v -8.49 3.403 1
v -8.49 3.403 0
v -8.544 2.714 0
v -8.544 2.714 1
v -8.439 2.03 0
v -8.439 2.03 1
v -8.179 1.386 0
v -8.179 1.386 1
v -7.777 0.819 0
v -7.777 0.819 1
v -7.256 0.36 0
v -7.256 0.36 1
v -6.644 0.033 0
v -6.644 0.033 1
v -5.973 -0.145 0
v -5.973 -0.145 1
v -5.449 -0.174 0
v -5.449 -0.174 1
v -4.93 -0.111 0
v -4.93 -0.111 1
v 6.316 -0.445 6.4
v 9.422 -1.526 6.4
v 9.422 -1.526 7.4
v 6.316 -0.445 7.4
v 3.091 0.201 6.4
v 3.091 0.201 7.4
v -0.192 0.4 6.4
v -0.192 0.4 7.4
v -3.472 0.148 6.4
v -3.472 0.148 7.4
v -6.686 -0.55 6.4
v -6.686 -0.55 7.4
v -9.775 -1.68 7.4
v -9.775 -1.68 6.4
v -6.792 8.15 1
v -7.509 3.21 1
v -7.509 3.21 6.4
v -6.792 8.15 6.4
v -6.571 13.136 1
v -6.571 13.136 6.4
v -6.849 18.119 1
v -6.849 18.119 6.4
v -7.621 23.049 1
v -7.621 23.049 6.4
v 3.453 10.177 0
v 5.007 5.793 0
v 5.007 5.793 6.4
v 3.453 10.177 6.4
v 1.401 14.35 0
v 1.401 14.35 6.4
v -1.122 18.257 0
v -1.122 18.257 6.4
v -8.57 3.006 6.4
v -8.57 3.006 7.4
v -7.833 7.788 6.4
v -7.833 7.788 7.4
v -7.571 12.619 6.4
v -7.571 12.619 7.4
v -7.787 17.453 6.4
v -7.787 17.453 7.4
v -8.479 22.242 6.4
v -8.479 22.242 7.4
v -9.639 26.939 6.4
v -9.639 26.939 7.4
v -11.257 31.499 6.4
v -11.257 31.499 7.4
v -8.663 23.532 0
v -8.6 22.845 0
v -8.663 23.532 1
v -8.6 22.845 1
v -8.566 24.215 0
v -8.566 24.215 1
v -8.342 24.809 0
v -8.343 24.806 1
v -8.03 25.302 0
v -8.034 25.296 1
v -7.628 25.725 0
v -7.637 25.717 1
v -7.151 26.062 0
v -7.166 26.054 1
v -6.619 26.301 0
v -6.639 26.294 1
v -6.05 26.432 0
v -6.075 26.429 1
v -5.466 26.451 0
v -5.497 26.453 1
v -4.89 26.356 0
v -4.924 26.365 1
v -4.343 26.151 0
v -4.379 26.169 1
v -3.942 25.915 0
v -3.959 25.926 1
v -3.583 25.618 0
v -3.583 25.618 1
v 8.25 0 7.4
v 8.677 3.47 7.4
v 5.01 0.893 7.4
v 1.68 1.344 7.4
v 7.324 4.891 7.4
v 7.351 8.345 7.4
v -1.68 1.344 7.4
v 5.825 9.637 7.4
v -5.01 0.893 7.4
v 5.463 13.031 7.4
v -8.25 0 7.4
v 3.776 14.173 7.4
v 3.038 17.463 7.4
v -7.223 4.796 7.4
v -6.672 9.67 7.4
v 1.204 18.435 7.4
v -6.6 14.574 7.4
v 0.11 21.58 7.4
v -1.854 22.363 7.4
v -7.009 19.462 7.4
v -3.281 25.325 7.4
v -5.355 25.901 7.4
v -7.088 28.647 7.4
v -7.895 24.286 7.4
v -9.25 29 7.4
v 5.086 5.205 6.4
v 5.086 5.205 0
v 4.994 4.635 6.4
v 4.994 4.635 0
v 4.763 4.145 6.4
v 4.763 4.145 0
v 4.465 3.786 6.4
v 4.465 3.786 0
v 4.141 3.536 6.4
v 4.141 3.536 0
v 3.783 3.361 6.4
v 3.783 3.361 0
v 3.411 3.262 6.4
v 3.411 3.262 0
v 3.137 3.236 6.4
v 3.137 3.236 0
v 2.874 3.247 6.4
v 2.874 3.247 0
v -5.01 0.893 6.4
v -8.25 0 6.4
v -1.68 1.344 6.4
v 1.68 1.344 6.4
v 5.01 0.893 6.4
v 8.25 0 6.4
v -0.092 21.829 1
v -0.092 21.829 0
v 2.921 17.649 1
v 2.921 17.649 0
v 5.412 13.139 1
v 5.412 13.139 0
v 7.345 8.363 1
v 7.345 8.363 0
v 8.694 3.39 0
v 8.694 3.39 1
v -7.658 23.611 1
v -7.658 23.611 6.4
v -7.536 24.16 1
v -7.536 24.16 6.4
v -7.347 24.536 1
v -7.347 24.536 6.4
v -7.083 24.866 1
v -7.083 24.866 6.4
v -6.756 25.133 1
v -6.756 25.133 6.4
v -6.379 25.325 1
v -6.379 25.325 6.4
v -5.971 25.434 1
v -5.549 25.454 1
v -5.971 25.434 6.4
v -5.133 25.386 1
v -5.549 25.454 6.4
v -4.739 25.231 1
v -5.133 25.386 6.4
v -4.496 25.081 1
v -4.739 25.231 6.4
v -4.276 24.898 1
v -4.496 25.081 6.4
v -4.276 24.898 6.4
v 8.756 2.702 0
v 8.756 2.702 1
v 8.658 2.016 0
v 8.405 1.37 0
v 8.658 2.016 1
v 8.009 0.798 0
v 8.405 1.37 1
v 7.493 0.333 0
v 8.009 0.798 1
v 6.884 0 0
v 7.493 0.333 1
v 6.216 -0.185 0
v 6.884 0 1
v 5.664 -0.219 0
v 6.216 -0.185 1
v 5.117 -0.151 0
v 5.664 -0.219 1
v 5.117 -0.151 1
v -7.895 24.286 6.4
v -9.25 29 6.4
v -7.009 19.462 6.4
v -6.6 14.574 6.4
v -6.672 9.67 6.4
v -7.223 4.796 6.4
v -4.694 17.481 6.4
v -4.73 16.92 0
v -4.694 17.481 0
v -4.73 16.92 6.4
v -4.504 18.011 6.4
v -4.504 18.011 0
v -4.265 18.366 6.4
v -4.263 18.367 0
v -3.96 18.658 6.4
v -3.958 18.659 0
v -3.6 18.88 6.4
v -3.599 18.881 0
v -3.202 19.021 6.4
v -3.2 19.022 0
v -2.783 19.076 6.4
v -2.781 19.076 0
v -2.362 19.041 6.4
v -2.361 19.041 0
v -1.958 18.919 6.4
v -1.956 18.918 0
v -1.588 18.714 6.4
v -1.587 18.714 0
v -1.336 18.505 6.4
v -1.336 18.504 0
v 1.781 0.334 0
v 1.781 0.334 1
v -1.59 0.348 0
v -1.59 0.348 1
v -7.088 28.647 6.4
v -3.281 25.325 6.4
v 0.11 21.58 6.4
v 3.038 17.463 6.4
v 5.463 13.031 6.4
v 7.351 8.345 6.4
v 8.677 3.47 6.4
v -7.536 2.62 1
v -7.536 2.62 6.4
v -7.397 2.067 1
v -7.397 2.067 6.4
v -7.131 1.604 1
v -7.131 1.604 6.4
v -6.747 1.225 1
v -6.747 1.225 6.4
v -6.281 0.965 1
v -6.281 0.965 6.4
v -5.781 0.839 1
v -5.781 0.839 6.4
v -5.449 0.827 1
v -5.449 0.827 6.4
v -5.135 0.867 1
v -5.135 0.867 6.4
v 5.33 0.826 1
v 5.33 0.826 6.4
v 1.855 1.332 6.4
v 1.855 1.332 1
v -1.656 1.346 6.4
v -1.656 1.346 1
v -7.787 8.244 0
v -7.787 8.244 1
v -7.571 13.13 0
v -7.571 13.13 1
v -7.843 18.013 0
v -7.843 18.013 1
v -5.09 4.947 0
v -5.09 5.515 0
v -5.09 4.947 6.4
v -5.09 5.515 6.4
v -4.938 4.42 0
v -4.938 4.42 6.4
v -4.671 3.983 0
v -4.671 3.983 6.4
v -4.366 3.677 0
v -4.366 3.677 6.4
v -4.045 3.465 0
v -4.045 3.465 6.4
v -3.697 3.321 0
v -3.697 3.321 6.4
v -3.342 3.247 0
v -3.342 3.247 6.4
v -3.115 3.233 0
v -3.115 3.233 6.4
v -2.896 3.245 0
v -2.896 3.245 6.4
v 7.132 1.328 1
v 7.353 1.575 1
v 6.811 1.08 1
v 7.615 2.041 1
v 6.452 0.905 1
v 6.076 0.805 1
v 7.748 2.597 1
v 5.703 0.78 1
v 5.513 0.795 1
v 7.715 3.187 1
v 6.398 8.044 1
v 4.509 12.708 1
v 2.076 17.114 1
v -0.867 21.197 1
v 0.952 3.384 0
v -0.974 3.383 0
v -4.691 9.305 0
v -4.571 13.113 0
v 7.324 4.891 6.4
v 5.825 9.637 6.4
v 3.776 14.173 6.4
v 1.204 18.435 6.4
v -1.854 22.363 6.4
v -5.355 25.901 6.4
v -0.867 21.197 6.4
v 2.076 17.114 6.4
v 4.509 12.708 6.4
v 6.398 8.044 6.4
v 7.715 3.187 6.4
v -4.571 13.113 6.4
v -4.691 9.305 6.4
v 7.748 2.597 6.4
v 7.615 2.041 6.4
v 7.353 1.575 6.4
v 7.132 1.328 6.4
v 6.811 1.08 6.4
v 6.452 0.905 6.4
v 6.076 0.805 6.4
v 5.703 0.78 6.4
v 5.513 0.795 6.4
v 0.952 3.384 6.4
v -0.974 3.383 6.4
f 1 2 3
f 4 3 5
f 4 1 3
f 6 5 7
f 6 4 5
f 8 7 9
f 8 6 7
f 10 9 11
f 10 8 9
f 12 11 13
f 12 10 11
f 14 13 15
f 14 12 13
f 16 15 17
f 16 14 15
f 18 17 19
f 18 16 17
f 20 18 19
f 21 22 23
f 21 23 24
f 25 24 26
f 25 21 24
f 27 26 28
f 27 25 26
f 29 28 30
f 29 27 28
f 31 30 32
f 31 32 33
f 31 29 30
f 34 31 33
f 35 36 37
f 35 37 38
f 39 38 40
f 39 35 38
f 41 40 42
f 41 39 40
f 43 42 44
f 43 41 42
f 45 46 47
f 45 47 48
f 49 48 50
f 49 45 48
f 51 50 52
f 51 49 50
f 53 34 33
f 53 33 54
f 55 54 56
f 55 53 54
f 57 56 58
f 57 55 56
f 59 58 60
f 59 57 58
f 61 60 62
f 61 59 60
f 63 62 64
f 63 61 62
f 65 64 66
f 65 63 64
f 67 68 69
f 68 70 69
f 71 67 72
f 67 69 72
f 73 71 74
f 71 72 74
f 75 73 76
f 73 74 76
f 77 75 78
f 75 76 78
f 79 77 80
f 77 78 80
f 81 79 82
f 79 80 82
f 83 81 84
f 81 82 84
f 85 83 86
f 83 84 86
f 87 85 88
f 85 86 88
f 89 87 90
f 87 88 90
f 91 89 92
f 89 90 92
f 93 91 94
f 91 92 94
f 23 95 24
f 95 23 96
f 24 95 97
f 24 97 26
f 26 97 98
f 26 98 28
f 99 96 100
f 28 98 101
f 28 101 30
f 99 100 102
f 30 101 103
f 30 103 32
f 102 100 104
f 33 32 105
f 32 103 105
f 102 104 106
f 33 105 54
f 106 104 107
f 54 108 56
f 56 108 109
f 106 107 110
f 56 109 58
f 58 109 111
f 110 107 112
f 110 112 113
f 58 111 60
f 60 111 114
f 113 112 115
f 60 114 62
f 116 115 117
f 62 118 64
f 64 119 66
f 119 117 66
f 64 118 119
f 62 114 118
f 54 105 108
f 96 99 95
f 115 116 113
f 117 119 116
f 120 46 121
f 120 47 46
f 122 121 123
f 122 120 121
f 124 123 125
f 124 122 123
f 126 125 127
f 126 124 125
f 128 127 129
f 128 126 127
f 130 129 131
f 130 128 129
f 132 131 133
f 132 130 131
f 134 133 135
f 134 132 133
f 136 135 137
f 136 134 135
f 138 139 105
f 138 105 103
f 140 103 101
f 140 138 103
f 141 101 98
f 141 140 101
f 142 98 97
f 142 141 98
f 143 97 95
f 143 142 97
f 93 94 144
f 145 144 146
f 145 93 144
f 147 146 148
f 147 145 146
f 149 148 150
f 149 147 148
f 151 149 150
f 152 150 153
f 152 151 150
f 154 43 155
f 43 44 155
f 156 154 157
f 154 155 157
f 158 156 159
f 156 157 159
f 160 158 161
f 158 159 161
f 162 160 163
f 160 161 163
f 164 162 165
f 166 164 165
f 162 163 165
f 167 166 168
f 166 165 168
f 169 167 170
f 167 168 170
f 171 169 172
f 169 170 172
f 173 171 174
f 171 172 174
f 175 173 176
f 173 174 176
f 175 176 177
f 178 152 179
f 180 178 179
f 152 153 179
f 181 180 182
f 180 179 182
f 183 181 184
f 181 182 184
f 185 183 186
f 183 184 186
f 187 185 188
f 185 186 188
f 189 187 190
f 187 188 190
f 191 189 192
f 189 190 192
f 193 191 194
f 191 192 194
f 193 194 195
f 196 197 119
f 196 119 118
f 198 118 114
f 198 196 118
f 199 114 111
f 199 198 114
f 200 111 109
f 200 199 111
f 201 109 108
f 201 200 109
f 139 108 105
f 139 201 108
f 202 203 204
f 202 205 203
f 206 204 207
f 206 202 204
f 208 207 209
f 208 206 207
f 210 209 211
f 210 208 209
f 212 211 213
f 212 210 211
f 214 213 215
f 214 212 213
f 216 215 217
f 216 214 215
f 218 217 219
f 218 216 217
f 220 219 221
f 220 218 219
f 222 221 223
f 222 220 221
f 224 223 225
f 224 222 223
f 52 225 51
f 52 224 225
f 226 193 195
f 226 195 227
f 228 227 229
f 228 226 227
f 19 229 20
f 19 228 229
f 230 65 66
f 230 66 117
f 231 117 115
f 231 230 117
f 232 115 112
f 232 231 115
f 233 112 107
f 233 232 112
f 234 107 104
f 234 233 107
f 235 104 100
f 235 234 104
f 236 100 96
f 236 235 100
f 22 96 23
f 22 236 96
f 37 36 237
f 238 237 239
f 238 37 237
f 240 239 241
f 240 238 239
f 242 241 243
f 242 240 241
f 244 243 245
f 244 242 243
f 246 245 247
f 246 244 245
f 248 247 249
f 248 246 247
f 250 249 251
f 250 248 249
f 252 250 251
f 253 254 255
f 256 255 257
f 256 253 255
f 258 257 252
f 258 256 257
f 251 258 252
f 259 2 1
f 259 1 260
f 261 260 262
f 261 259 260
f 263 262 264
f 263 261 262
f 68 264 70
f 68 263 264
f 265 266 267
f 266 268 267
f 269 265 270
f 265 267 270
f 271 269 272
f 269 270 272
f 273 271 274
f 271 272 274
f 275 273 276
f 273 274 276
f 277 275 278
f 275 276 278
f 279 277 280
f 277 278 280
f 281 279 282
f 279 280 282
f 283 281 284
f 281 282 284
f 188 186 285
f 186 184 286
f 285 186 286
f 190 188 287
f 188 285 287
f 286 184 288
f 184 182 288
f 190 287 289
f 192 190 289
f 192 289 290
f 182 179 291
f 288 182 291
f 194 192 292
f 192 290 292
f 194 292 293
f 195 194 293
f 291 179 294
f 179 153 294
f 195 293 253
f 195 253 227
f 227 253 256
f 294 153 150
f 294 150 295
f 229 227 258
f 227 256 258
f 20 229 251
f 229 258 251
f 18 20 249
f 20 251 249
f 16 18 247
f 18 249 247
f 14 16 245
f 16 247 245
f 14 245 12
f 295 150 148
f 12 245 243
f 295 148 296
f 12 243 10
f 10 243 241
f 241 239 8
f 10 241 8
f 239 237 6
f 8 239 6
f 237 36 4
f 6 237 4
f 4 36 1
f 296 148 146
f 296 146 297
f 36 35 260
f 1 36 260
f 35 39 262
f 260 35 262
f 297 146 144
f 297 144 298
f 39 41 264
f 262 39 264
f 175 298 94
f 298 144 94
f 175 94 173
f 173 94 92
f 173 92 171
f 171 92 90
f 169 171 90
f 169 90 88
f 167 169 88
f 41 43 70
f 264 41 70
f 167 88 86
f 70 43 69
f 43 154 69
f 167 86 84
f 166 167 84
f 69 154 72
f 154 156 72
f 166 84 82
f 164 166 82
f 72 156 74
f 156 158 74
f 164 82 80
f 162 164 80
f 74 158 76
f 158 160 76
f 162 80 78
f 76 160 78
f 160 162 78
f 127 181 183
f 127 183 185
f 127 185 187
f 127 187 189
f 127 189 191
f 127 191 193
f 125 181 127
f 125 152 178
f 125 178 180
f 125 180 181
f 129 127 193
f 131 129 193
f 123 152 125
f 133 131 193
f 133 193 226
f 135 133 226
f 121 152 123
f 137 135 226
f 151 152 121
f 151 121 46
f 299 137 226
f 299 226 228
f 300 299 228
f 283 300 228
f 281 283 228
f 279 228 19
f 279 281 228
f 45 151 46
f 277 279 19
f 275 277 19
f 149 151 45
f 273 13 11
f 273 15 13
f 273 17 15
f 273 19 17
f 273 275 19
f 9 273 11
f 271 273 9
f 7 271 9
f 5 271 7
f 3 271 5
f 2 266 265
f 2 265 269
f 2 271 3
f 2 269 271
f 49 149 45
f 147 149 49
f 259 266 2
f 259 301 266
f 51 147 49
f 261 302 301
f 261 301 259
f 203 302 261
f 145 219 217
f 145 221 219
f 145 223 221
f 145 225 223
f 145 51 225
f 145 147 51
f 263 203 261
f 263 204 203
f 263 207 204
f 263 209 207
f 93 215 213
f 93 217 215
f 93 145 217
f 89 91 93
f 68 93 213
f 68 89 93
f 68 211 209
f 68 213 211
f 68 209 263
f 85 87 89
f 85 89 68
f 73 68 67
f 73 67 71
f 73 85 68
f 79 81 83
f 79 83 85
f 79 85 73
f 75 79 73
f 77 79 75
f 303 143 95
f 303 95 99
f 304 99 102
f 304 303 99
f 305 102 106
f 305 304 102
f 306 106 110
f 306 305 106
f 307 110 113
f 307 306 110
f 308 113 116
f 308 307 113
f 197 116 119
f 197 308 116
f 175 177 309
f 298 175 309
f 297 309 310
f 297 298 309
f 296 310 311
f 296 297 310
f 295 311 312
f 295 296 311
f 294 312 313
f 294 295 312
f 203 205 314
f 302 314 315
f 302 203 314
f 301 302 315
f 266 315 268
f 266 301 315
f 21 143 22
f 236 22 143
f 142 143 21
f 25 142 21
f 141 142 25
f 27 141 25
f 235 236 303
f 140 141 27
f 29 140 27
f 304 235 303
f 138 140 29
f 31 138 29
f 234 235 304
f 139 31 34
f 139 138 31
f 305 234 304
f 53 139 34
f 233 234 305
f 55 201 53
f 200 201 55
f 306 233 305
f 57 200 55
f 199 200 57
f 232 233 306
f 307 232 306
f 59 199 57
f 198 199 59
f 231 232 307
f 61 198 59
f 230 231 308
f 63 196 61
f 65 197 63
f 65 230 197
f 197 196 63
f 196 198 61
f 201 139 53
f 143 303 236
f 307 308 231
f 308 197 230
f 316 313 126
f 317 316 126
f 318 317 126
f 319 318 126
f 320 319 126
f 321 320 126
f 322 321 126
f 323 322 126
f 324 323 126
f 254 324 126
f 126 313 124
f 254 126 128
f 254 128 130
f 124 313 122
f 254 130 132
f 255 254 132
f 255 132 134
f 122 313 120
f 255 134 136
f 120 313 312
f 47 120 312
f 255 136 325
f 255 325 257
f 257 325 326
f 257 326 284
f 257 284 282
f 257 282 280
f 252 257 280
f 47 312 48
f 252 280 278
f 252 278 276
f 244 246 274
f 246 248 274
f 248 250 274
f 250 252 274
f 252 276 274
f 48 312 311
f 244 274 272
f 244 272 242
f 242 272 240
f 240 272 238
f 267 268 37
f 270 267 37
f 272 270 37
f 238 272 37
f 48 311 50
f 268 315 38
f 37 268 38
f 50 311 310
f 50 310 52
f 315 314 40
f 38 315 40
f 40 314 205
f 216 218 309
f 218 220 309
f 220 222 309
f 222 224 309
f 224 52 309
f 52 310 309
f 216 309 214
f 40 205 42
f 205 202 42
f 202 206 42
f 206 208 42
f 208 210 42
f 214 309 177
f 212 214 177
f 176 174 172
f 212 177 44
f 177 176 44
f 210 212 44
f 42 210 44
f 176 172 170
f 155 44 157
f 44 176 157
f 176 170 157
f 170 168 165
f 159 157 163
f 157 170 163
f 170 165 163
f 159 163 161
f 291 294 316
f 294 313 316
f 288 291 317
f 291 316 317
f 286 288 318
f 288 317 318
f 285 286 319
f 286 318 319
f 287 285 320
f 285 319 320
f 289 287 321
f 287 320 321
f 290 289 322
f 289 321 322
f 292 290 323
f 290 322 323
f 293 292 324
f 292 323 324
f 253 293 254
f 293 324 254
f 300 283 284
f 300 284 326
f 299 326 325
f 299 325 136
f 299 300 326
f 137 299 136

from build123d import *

# Parameters (mm, degrees)
BOSS_EXTRUDE1_DEPTH = 6.4
BOSS_EXTRUDE2_DEPTH = 1
BOSS_EXTRUDE3_START = 6.4
BOSS_EXTRUDE3_DEPTH = 1
FILLET1_R           = 2
FILLET2_R           = 2
FILLET3_R           = 3


with BuildPart() as part:
    # Sketch1 → Boss-Extrude1 (new body)
    with BuildSketch(Plane.XY):
        with BuildLine():
            ThreePointArc((-8.25, 0), (-6.599997803, 14.574138007), (-9.25, 29))
            ThreePointArc((-9.25, 29), (2.55299652, 16.342325486), (8.25, 0))
            ThreePointArc((8.25, 0), (0, 1.4004767), (-8.25, 0))
        make_face()
        with BuildLine():
            ThreePointArc((-5.546053811, 2.824732359), (0.107700878, 3.400261894), (5.7566842, 2.779646266))
            ThreePointArc((5.7566842, 2.779646266), (1.607801999, 13.980744157), (-5.663467174, 23.457371305))
            ThreePointArc((-5.663467174, 23.457371305), (-4.571139724, 13.146933818), (-5.546053811, 2.824732359))
        make_face(mode=Mode.SUBTRACT)
    extrude(amount=BOSS_EXTRUDE1_DEPTH)

    # Sketch1<3> → Boss-Extrude2 (add)
    with BuildSketch(Plane.XY):
        with BuildLine():
            ThreePointArc((-9.774519405, -1.680153546), (-7.619164248, 15.038837468), (-11.257417673, 31.498889971))
            ThreePointArc((-11.257417673, 31.498889971), (3.03782158, 17.463074836), (9.422096196, -1.526369849))
            ThreePointArc((9.422096196, -1.526369849), (-0.192257343, 0.399706627), (-9.774519405, -1.680153546))
        make_face()
        with BuildLine():
            ThreePointArc((-8.25, 0), (0, 1.4004767), (8.25, 0))
            ThreePointArc((8.25, 0), (2.55299652, 16.342325486), (-9.25, 29))
            ThreePointArc((-9.25, 29), (-6.599997803, 14.574138007), (-8.25, 0))
        make_face(mode=Mode.SUBTRACT)
    extrude(amount=BOSS_EXTRUDE2_DEPTH)

    # Fillet1
    fillet1_edges = [part.edges().sort_by_distance(p)[0] for p in [
        (-9.25, 29, 3.7),
        (8.25, 0, 3.7),
        (-8.25, 0, 3.7),
    ]]
    fillet(fillet1_edges, radius=FILLET1_R)

    # Fillet2
    fillet2_edges = [part.edges().sort_by_distance(p)[0] for p in [
        (5.7566842, 2.779646266, 3.2),
        (-5.663467174, 23.457371305, 3.2),
        (-5.546053811, 2.824732359, 3.2),
    ]]
    fillet(fillet2_edges, radius=FILLET2_R)

    # Fillet3
    fillet3_edges = [part.edges().sort_by_distance(p)[0] for p in [
        (-11.257417673, 31.498889971, 0.5),
        (-9.774519405, -1.680153546, 0.5),
        (9.422096196, -1.526369849, 0.5),
    ]]
    fillet(fillet3_edges, radius=FILLET3_R)


with BuildPart() as body_2:
    # Sketch1<4> → Boss-Extrude3 (new body)
    with BuildSketch(Plane.XY.offset(BOSS_EXTRUDE3_START)):
        with BuildLine():
            ThreePointArc((-9.774519405, -1.680153546), (-7.619164248, 15.038837468), (-11.257417673, 31.498889971))
            ThreePointArc((-11.257417673, 31.498889971), (3.03782158, 17.463074836), (9.422096196, -1.526369849))
            ThreePointArc((9.422096196, -1.526369849), (-0.192257343, 0.399706627), (-9.774519405, -1.680153546))
        make_face()
        with BuildLine():
            ThreePointArc((-8.25, 0), (0, 1.4004767), (8.25, 0))
            ThreePointArc((8.25, 0), (2.55299652, 16.342325486), (-9.25, 29))
            ThreePointArc((-9.25, 29), (-6.599997803, 14.574138007), (-8.25, 0))
        make_face(mode=Mode.SUBTRACT)
    extrude(amount=BOSS_EXTRUDE3_DEPTH)


solid = Compound([part.part, body_2.part])
